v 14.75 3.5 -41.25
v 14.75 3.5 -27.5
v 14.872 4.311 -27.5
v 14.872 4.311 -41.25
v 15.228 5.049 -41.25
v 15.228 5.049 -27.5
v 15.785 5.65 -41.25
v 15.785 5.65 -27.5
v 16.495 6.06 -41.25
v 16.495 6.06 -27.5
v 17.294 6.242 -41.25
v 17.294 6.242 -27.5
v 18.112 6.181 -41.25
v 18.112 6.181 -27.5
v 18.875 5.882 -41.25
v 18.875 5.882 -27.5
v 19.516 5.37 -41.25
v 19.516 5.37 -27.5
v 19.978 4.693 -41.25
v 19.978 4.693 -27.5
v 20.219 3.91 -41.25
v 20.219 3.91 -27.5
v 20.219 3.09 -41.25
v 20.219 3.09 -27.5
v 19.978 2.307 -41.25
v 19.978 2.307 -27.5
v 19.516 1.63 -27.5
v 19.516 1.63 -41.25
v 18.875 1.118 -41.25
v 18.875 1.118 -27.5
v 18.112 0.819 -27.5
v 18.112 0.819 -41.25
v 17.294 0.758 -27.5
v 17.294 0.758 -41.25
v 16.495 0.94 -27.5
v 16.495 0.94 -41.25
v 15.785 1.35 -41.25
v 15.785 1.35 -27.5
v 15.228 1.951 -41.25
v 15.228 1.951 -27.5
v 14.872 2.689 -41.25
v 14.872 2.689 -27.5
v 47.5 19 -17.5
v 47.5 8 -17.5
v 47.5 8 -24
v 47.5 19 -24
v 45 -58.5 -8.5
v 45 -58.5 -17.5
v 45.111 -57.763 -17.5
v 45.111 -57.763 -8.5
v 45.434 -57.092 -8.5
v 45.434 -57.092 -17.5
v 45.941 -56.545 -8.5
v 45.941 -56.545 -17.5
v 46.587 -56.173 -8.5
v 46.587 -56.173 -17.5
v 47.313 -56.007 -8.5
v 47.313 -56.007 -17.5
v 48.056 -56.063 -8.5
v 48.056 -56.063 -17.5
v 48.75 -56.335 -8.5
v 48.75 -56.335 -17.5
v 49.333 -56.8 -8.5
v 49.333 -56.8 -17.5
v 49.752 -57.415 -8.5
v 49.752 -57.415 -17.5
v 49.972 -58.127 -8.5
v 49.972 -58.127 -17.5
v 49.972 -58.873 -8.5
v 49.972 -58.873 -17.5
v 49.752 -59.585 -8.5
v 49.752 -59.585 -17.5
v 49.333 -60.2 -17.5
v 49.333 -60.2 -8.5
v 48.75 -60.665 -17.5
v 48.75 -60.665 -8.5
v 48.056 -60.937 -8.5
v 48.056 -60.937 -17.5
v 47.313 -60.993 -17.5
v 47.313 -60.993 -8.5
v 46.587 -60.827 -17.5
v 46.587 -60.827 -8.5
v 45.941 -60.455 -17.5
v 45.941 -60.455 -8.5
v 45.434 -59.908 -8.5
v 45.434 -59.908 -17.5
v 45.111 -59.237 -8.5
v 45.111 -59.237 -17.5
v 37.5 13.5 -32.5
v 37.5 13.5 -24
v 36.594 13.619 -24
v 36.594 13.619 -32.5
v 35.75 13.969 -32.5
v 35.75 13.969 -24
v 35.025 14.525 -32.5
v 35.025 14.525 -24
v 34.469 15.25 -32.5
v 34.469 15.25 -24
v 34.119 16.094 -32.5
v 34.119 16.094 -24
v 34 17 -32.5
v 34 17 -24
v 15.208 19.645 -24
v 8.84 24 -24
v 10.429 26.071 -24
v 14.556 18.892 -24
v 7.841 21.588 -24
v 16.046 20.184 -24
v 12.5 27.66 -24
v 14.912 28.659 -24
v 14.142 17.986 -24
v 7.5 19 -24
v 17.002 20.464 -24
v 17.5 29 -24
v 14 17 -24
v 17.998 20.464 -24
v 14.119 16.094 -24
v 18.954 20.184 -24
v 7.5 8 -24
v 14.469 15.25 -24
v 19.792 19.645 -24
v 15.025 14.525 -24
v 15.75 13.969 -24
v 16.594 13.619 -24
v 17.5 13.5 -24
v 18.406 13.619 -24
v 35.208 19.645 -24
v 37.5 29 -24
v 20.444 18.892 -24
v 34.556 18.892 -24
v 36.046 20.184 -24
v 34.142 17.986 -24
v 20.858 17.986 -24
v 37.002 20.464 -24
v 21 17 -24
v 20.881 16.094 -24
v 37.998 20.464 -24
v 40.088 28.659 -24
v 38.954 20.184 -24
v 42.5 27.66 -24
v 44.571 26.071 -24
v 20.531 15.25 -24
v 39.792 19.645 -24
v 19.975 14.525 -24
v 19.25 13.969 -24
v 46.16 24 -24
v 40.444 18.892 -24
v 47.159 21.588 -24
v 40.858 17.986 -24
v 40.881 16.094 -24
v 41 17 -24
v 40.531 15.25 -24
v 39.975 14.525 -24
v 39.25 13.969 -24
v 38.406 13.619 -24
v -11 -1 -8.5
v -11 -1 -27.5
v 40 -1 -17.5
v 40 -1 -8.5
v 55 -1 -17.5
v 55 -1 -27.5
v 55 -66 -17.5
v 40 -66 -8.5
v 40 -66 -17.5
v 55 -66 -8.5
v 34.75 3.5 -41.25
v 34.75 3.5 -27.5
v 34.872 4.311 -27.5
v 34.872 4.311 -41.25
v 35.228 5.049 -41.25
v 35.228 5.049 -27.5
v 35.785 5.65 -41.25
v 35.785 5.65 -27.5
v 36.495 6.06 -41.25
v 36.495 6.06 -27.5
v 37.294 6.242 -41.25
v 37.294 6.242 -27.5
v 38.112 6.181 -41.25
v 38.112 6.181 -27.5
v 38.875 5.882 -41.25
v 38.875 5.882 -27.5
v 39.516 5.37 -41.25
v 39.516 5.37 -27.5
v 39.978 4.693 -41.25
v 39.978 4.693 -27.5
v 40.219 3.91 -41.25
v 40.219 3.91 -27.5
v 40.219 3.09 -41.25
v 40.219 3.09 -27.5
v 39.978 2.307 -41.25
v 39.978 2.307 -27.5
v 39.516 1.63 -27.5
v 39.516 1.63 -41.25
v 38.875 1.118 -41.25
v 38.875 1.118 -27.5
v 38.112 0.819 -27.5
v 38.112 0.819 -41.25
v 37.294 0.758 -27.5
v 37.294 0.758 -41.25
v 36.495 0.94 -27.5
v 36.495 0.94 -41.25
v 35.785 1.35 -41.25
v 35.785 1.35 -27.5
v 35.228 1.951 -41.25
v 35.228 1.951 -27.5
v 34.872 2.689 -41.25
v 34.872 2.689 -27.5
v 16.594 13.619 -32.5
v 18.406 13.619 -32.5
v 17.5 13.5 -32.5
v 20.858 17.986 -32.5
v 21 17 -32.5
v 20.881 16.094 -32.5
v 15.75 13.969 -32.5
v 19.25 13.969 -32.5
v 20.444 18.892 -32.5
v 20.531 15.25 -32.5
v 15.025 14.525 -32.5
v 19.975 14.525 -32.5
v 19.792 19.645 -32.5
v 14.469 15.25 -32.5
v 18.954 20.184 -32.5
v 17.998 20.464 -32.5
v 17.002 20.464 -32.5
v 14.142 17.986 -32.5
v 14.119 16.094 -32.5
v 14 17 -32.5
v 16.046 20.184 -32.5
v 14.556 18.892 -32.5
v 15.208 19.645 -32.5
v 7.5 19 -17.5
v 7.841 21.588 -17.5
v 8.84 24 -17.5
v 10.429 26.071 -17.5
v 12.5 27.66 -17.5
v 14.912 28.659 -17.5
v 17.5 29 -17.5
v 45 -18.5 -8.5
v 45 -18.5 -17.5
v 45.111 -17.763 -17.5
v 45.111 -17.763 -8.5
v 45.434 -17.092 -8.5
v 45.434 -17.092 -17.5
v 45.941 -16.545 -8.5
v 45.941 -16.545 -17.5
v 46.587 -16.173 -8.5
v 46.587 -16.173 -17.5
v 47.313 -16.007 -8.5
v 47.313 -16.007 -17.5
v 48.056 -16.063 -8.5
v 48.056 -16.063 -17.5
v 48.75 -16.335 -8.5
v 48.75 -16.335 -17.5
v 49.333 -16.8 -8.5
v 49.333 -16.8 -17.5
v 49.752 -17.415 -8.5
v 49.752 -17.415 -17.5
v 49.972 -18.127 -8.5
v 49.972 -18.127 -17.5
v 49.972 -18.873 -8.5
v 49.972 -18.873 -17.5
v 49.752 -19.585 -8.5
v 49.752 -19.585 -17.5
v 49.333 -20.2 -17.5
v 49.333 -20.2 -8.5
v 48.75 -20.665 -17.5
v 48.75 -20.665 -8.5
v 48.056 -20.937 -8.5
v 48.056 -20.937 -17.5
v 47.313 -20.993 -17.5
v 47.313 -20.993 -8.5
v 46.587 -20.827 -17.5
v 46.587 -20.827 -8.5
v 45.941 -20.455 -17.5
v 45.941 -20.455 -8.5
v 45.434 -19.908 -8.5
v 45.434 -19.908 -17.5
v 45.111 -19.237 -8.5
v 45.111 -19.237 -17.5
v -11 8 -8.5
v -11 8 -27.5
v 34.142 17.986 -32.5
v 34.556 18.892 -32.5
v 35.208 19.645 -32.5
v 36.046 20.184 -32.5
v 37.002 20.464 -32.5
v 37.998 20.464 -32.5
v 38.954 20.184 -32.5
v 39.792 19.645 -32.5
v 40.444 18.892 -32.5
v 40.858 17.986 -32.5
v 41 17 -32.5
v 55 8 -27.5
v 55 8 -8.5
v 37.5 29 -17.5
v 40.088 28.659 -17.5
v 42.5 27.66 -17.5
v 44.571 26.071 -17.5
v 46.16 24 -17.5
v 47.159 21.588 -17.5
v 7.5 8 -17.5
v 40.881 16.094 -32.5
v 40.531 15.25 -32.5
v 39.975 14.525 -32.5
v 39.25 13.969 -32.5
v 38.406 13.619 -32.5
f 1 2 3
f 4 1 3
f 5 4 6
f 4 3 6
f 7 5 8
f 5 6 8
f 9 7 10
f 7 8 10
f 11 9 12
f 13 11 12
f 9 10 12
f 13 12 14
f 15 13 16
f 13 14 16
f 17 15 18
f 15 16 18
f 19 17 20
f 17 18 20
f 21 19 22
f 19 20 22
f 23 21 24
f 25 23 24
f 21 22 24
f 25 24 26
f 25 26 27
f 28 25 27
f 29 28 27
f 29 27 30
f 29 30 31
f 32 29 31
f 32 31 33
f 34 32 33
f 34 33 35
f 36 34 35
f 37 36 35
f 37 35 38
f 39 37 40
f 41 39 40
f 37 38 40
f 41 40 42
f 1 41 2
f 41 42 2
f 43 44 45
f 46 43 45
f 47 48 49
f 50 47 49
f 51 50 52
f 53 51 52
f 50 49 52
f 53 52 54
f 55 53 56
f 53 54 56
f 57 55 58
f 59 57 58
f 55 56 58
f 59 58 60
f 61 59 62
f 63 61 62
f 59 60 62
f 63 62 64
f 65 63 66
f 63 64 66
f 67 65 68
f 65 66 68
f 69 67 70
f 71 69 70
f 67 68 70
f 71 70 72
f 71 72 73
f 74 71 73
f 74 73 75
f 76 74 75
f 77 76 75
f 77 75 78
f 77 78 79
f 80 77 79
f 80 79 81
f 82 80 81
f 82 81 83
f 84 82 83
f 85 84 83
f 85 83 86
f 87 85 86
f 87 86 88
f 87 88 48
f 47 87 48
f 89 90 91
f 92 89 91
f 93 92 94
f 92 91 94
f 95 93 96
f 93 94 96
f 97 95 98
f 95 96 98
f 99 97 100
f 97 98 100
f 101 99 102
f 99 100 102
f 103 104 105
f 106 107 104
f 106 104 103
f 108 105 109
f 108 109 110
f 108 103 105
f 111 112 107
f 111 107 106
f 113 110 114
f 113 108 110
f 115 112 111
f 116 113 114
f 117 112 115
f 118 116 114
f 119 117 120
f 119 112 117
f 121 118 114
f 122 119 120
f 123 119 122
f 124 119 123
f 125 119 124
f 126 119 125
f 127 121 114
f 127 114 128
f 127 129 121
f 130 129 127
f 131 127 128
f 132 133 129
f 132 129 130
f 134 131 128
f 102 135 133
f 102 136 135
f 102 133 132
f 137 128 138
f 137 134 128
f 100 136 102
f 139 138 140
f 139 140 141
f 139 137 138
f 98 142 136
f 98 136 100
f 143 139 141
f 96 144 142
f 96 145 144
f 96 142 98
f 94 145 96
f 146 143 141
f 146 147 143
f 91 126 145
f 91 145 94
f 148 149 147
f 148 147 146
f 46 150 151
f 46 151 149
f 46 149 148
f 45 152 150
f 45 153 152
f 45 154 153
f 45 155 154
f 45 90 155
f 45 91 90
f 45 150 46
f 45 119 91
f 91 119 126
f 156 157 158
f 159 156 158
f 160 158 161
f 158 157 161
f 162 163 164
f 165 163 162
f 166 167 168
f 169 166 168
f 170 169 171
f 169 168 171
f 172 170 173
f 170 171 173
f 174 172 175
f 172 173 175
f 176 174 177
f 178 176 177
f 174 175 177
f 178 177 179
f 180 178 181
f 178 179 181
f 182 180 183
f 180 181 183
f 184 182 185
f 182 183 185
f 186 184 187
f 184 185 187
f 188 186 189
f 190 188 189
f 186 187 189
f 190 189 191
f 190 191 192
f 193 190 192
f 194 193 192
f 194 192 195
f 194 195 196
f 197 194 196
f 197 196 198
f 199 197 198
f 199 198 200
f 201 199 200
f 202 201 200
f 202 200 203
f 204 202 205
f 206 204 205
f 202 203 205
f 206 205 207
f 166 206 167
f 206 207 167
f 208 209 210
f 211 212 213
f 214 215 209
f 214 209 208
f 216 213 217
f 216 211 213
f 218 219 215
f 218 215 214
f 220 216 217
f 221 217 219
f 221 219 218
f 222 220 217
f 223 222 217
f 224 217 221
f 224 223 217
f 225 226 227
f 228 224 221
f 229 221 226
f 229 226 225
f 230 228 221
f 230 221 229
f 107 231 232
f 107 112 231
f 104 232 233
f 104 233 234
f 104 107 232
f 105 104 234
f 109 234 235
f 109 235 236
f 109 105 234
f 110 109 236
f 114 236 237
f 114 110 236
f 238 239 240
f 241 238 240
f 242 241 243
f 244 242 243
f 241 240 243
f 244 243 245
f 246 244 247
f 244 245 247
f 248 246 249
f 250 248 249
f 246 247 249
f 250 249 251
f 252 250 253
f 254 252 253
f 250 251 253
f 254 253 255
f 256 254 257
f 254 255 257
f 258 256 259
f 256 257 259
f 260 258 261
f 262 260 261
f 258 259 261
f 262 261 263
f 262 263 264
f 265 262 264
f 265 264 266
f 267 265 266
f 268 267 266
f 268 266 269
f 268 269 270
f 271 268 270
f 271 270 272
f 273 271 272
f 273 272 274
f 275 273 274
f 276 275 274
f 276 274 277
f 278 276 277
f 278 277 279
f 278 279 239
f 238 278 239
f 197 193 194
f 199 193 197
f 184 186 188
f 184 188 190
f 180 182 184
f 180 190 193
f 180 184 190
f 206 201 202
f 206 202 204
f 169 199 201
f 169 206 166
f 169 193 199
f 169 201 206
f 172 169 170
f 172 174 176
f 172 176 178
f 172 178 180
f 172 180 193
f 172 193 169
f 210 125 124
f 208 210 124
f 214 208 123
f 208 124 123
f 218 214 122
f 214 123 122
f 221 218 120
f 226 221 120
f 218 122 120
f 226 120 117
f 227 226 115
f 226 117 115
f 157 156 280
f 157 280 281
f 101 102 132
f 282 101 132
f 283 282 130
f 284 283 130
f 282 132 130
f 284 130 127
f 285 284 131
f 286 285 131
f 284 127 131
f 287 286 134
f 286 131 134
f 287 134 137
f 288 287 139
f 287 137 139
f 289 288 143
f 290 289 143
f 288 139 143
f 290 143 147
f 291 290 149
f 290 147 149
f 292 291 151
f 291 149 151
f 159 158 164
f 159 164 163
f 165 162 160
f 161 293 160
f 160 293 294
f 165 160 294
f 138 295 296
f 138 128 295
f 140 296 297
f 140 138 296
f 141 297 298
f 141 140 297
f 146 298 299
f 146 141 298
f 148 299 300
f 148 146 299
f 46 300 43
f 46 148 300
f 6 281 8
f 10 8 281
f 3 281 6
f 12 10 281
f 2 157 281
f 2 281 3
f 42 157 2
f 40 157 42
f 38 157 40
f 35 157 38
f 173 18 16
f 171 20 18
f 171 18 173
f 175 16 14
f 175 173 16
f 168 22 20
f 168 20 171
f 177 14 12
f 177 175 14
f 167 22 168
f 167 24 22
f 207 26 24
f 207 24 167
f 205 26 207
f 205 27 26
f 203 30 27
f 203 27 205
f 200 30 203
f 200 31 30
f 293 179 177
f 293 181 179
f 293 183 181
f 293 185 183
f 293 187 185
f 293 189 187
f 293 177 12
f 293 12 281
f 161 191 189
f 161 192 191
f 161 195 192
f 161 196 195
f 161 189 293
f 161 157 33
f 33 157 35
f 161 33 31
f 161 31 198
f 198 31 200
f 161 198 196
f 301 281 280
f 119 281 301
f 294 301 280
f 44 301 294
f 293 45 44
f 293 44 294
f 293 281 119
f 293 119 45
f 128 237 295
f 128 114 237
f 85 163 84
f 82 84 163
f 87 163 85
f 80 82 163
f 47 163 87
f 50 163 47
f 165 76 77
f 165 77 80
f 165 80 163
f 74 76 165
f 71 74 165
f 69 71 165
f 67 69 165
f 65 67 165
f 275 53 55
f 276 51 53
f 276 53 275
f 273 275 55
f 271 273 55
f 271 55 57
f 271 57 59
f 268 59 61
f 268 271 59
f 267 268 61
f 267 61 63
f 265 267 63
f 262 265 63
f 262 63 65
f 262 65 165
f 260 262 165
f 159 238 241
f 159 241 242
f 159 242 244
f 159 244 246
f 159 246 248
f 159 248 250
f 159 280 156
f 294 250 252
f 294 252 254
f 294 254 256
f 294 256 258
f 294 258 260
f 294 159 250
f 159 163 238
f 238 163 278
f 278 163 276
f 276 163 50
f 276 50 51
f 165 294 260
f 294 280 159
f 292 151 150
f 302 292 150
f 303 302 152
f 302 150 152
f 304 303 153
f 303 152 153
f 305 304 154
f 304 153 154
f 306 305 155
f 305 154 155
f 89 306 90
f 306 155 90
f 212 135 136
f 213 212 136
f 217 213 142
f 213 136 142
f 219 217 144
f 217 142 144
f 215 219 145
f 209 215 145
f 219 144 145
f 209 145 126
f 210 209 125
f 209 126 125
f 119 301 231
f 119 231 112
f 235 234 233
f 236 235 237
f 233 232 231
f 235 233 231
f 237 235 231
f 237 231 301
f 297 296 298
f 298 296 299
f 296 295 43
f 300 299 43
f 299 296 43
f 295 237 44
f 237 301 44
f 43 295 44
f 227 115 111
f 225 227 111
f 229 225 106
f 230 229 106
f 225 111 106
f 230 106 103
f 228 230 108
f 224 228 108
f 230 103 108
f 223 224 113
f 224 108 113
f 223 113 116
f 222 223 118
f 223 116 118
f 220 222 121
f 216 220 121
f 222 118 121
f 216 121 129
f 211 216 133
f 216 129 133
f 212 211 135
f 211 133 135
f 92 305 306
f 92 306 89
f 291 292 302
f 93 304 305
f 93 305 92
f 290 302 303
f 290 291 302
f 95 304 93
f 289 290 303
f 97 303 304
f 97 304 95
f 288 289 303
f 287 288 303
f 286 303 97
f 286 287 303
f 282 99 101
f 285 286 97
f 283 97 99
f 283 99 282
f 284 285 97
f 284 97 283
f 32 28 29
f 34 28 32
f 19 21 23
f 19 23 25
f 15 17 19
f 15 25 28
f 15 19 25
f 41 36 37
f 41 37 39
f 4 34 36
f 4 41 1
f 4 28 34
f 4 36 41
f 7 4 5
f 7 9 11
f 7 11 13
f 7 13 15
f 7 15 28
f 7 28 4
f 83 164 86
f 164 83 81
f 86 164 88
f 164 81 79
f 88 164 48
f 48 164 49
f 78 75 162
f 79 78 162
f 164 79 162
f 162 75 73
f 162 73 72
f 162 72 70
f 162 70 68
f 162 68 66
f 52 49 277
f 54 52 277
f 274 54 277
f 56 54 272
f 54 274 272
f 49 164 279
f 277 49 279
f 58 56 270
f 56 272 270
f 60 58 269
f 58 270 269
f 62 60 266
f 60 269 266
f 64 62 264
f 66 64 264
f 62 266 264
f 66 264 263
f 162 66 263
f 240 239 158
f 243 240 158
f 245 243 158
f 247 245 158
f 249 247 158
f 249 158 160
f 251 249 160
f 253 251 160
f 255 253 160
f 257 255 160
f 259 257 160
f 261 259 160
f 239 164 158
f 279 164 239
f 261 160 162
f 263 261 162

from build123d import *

# Parameters (mm, degrees)
BOSS_EXTRUDE2_DEPTH      = 8
BOSS_EXTRUDE2_DEPTH_BACK = 1
SKETCH1_W                = 66
SKETCH1_H                = 19
SKETCH3_R                = 2.75
BOSS_EXTRUDE3_DEPTH      = 13.75
SKETCH4_W                = 4.5
SKETCH4_H                = 6.5
BOSS_EXTRUDE4_DEPTH      = 15
BOSS_EXTRUDE5_DEPTH      = 8.5
SKETCH8_W                = 9
SKETCH8_H                = 6.5
BOSS_EXTRUDE6_DEPTH      = 6
SKETCH9_W                = 15.5
SKETCH9_H                = 6.5
BOSS_EXTRUDE7_DEPTH      = 21
BOSS_EXTRUDE8_DEPTH      = 8.5
CUT_EXTRUDE2_START       = -8.5
SKETCH12_R               = 3.5
CUT_EXTRUDE2_DEPTH       = 8.5
FILLET1_R                = 10
SKETCH14_W               = 15
SKETCH14_H               = 9
BOSS_EXTRUDE10_DEPTH     = 65
CUT_EXTRUDE3_REACH       = 91.135
SKETCH15_R               = 2.5


with BuildPart() as part:
    # Sketch1 → Boss-Extrude2 (new, two sides: drawn at the far end of the back side and taken through both)
    with BuildSketch(Plane(origin=(0, 0, 0), x_dir=(1, 0, 0), z_dir=(0, 1, 0)).offset(-BOSS_EXTRUDE2_DEPTH_BACK)):
        with Locations((22, 18)):
            Rectangle(SKETCH1_W, SKETCH1_H)
    extrude(amount=BOSS_EXTRUDE2_DEPTH + BOSS_EXTRUDE2_DEPTH_BACK)

    # Sketch3 → Boss-Extrude3 (add)
    with BuildSketch(Plane(origin=(0, 0, -27.5), x_dir=(-1, 0, 0), z_dir=(0, 0, -1))):
        with Locations((-37.5, 3.5)):
            Circle(SKETCH3_R)
        with Locations((-17.5, 3.5)):
            Circle(SKETCH3_R)
    extrude(amount=BOSS_EXTRUDE3_DEPTH)

    # Sketch4 → Boss-Extrude4 (add)
    with BuildSketch(Plane(origin=(0, 8, 0), x_dir=(1, 0, 0), z_dir=(0, 1, 0))):
        with Locations((25.25, 20.75)):
            Rectangle(SKETCH4_W, SKETCH4_H)
        with Locations((29.75, 20.75)):
            Rectangle(SKETCH4_W, SKETCH4_H)
    extrude(amount=BOSS_EXTRUDE4_DEPTH)

    # Sketch5 → Boss-Extrude5 (add)
    with BuildSketch(Plane(origin=(0, 0, -24), x_dir=(-1, 0, 0), z_dir=(0, 0, -1))):
        with BuildLine():
            ThreePointArc((-25.636419782, 13.037388184), (-24.436298745, 14.307742745), (-24, 16))
            ThreePointArc((-24, 16), (-29.974873734, 18.474873734), (-27.5, 12.5))
            ThreePointArc((-27.5, 12.5), (-26.685966178, 12.595980474), (-25.916578842, 12.878657751))
            ThreePointArc((-25.916578842, 12.878657751), (-25.85405917, 13.094916041), (-25.636419782, 13.037388184))
        make_face()
    extrude(amount=BOSS_EXTRUDE5_DEPTH)

    # Sketch8 → Boss-Extrude6 (add)
    with BuildSketch(Plane(origin=(0, 23, 0), x_dir=(1, 0, 0), z_dir=(0, 1, 0))):
        with Locations((27.5, 20.75)):
            Rectangle(SKETCH8_W, SKETCH8_H)
    extrude(amount=BOSS_EXTRUDE6_DEPTH)

    # Sketch9 → Boss-Extrude7 (add)
    with BuildSketch(Plane(origin=(0, 8, 0), x_dir=(1, 0, 0), z_dir=(0, 1, 0))):
        with Locations((15.25, 20.75)):
            Rectangle(SKETCH9_W, SKETCH9_H)
        with Locations((39.75, 20.75)):
            Rectangle(SKETCH9_W, SKETCH9_H)
    extrude(amount=BOSS_EXTRUDE7_DEPTH)

    # Sketch10 → Boss-Extrude8 (add)
    with BuildSketch(Plane(origin=(0, 0, -24), x_dir=(-1, 0, 0), z_dir=(0, 0, -1))):
        with BuildLine():
            Line((-21, 17), (-17.5, 17))
            Line((-17.5, 17), (-14, 17))
            ThreePointArc((-14, 17), (-17.5, 20.5), (-21, 17))
        make_face()
        with BuildLine():
            Line((-17.5, 13.5), (-17.5, 17))
            Line((-17.5, 17), (-21, 17))
            ThreePointArc((-21, 17), (-19.974873734, 14.525126266), (-17.5, 13.5))
        make_face()
        with BuildLine():
            Line((-14, 17), (-17.5, 17))
            Line((-17.5, 17), (-17.5, 13.5))
            ThreePointArc((-17.5, 13.5), (-15.025126266, 14.525126266), (-14, 17))
        make_face()
        with BuildLine():
            Line((-37.5, 17), (-34, 17))
            ThreePointArc((-34, 17), (-37.5, 20.5), (-41, 17))
            Line((-41, 17), (-37.5, 17))
        make_face()
        with BuildLine():
            ThreePointArc((-37.5, 13.5), (-35.025126266, 14.525126266), (-34, 17))
            Line((-34, 17), (-37.5, 17))
            Line((-37.5, 17), (-37.5, 13.5))
        make_face()
        with BuildLine():
            Line((-37.5, 13.5), (-37.5, 17))
            Line((-37.5, 17), (-41, 17))
            ThreePointArc((-41, 17), (-39.974873734, 14.525126266), (-37.5, 13.5))
        make_face()
    extrude(amount=BOSS_EXTRUDE8_DEPTH)

    # Sketch12 → Cut-Extrude2 (cut)
    with BuildSketch(Plane(origin=(0, 0, -32.5), x_dir=(-1, 0, 0), z_dir=(0, 0, -1)).offset(CUT_EXTRUDE2_START)):
        with Locations((-27.5, 16)):
            Circle(SKETCH12_R)
    extrude(amount=CUT_EXTRUDE2_DEPTH, mode=Mode.SUBTRACT)

    # Fillet1
    fillet1_edges = [part.edges().sort_by_distance(p)[0] for p in [
        (7.5, 29, -20.75),
        (47.5, 29, -20.75),
    ]]
    fillet(fillet1_edges, radius=FILLET1_R)

    # Sketch14 → Boss-Extrude10 (add)
    with BuildSketch(Plane.XZ.offset(1)):
        with Locations((47.5, -13)):
            Rectangle(SKETCH14_W, SKETCH14_H)
    extrude(amount=BOSS_EXTRUDE10_DEPTH)

    # Sketch15 → Cut-Extrude3 (cut, up to next)
    with BuildSketch(Plane(origin=(0, 0, -17.5), x_dir=(-1, 0, 0), z_dir=(0, 0, -1)), mode=Mode.PRIVATE) as cut_extrude3_sk1:
        with Locations((-47.5, -58.5)):
            Circle(SKETCH15_R)
    cut_extrude3_tool1 = extrude(cut_extrude3_sk1.sketch, amount=-CUT_EXTRUDE3_REACH, mode=Mode.PRIVATE) & part.part
    # Sketch15 → Cut-Extrude3 (cut, up to next)
    with BuildSketch(Plane(origin=(0, 0, -17.5), x_dir=(-1, 0, 0), z_dir=(0, 0, -1)), mode=Mode.PRIVATE) as cut_extrude3_sk2:
        with Locations((-47.5, -18.5)):
            Circle(SKETCH15_R)
    cut_extrude3_tool2 = extrude(cut_extrude3_sk2.sketch, amount=-CUT_EXTRUDE3_REACH, mode=Mode.PRIVATE) & part.part
    add(cut_extrude3_tool1.solids().sort_by_distance((47.5, -58.5, -17.5))[0], mode=Mode.SUBTRACT)
    add(cut_extrude3_tool2.solids().sort_by_distance((47.5, -18.5, -17.5))[0], mode=Mode.SUBTRACT)


solid = part.part
